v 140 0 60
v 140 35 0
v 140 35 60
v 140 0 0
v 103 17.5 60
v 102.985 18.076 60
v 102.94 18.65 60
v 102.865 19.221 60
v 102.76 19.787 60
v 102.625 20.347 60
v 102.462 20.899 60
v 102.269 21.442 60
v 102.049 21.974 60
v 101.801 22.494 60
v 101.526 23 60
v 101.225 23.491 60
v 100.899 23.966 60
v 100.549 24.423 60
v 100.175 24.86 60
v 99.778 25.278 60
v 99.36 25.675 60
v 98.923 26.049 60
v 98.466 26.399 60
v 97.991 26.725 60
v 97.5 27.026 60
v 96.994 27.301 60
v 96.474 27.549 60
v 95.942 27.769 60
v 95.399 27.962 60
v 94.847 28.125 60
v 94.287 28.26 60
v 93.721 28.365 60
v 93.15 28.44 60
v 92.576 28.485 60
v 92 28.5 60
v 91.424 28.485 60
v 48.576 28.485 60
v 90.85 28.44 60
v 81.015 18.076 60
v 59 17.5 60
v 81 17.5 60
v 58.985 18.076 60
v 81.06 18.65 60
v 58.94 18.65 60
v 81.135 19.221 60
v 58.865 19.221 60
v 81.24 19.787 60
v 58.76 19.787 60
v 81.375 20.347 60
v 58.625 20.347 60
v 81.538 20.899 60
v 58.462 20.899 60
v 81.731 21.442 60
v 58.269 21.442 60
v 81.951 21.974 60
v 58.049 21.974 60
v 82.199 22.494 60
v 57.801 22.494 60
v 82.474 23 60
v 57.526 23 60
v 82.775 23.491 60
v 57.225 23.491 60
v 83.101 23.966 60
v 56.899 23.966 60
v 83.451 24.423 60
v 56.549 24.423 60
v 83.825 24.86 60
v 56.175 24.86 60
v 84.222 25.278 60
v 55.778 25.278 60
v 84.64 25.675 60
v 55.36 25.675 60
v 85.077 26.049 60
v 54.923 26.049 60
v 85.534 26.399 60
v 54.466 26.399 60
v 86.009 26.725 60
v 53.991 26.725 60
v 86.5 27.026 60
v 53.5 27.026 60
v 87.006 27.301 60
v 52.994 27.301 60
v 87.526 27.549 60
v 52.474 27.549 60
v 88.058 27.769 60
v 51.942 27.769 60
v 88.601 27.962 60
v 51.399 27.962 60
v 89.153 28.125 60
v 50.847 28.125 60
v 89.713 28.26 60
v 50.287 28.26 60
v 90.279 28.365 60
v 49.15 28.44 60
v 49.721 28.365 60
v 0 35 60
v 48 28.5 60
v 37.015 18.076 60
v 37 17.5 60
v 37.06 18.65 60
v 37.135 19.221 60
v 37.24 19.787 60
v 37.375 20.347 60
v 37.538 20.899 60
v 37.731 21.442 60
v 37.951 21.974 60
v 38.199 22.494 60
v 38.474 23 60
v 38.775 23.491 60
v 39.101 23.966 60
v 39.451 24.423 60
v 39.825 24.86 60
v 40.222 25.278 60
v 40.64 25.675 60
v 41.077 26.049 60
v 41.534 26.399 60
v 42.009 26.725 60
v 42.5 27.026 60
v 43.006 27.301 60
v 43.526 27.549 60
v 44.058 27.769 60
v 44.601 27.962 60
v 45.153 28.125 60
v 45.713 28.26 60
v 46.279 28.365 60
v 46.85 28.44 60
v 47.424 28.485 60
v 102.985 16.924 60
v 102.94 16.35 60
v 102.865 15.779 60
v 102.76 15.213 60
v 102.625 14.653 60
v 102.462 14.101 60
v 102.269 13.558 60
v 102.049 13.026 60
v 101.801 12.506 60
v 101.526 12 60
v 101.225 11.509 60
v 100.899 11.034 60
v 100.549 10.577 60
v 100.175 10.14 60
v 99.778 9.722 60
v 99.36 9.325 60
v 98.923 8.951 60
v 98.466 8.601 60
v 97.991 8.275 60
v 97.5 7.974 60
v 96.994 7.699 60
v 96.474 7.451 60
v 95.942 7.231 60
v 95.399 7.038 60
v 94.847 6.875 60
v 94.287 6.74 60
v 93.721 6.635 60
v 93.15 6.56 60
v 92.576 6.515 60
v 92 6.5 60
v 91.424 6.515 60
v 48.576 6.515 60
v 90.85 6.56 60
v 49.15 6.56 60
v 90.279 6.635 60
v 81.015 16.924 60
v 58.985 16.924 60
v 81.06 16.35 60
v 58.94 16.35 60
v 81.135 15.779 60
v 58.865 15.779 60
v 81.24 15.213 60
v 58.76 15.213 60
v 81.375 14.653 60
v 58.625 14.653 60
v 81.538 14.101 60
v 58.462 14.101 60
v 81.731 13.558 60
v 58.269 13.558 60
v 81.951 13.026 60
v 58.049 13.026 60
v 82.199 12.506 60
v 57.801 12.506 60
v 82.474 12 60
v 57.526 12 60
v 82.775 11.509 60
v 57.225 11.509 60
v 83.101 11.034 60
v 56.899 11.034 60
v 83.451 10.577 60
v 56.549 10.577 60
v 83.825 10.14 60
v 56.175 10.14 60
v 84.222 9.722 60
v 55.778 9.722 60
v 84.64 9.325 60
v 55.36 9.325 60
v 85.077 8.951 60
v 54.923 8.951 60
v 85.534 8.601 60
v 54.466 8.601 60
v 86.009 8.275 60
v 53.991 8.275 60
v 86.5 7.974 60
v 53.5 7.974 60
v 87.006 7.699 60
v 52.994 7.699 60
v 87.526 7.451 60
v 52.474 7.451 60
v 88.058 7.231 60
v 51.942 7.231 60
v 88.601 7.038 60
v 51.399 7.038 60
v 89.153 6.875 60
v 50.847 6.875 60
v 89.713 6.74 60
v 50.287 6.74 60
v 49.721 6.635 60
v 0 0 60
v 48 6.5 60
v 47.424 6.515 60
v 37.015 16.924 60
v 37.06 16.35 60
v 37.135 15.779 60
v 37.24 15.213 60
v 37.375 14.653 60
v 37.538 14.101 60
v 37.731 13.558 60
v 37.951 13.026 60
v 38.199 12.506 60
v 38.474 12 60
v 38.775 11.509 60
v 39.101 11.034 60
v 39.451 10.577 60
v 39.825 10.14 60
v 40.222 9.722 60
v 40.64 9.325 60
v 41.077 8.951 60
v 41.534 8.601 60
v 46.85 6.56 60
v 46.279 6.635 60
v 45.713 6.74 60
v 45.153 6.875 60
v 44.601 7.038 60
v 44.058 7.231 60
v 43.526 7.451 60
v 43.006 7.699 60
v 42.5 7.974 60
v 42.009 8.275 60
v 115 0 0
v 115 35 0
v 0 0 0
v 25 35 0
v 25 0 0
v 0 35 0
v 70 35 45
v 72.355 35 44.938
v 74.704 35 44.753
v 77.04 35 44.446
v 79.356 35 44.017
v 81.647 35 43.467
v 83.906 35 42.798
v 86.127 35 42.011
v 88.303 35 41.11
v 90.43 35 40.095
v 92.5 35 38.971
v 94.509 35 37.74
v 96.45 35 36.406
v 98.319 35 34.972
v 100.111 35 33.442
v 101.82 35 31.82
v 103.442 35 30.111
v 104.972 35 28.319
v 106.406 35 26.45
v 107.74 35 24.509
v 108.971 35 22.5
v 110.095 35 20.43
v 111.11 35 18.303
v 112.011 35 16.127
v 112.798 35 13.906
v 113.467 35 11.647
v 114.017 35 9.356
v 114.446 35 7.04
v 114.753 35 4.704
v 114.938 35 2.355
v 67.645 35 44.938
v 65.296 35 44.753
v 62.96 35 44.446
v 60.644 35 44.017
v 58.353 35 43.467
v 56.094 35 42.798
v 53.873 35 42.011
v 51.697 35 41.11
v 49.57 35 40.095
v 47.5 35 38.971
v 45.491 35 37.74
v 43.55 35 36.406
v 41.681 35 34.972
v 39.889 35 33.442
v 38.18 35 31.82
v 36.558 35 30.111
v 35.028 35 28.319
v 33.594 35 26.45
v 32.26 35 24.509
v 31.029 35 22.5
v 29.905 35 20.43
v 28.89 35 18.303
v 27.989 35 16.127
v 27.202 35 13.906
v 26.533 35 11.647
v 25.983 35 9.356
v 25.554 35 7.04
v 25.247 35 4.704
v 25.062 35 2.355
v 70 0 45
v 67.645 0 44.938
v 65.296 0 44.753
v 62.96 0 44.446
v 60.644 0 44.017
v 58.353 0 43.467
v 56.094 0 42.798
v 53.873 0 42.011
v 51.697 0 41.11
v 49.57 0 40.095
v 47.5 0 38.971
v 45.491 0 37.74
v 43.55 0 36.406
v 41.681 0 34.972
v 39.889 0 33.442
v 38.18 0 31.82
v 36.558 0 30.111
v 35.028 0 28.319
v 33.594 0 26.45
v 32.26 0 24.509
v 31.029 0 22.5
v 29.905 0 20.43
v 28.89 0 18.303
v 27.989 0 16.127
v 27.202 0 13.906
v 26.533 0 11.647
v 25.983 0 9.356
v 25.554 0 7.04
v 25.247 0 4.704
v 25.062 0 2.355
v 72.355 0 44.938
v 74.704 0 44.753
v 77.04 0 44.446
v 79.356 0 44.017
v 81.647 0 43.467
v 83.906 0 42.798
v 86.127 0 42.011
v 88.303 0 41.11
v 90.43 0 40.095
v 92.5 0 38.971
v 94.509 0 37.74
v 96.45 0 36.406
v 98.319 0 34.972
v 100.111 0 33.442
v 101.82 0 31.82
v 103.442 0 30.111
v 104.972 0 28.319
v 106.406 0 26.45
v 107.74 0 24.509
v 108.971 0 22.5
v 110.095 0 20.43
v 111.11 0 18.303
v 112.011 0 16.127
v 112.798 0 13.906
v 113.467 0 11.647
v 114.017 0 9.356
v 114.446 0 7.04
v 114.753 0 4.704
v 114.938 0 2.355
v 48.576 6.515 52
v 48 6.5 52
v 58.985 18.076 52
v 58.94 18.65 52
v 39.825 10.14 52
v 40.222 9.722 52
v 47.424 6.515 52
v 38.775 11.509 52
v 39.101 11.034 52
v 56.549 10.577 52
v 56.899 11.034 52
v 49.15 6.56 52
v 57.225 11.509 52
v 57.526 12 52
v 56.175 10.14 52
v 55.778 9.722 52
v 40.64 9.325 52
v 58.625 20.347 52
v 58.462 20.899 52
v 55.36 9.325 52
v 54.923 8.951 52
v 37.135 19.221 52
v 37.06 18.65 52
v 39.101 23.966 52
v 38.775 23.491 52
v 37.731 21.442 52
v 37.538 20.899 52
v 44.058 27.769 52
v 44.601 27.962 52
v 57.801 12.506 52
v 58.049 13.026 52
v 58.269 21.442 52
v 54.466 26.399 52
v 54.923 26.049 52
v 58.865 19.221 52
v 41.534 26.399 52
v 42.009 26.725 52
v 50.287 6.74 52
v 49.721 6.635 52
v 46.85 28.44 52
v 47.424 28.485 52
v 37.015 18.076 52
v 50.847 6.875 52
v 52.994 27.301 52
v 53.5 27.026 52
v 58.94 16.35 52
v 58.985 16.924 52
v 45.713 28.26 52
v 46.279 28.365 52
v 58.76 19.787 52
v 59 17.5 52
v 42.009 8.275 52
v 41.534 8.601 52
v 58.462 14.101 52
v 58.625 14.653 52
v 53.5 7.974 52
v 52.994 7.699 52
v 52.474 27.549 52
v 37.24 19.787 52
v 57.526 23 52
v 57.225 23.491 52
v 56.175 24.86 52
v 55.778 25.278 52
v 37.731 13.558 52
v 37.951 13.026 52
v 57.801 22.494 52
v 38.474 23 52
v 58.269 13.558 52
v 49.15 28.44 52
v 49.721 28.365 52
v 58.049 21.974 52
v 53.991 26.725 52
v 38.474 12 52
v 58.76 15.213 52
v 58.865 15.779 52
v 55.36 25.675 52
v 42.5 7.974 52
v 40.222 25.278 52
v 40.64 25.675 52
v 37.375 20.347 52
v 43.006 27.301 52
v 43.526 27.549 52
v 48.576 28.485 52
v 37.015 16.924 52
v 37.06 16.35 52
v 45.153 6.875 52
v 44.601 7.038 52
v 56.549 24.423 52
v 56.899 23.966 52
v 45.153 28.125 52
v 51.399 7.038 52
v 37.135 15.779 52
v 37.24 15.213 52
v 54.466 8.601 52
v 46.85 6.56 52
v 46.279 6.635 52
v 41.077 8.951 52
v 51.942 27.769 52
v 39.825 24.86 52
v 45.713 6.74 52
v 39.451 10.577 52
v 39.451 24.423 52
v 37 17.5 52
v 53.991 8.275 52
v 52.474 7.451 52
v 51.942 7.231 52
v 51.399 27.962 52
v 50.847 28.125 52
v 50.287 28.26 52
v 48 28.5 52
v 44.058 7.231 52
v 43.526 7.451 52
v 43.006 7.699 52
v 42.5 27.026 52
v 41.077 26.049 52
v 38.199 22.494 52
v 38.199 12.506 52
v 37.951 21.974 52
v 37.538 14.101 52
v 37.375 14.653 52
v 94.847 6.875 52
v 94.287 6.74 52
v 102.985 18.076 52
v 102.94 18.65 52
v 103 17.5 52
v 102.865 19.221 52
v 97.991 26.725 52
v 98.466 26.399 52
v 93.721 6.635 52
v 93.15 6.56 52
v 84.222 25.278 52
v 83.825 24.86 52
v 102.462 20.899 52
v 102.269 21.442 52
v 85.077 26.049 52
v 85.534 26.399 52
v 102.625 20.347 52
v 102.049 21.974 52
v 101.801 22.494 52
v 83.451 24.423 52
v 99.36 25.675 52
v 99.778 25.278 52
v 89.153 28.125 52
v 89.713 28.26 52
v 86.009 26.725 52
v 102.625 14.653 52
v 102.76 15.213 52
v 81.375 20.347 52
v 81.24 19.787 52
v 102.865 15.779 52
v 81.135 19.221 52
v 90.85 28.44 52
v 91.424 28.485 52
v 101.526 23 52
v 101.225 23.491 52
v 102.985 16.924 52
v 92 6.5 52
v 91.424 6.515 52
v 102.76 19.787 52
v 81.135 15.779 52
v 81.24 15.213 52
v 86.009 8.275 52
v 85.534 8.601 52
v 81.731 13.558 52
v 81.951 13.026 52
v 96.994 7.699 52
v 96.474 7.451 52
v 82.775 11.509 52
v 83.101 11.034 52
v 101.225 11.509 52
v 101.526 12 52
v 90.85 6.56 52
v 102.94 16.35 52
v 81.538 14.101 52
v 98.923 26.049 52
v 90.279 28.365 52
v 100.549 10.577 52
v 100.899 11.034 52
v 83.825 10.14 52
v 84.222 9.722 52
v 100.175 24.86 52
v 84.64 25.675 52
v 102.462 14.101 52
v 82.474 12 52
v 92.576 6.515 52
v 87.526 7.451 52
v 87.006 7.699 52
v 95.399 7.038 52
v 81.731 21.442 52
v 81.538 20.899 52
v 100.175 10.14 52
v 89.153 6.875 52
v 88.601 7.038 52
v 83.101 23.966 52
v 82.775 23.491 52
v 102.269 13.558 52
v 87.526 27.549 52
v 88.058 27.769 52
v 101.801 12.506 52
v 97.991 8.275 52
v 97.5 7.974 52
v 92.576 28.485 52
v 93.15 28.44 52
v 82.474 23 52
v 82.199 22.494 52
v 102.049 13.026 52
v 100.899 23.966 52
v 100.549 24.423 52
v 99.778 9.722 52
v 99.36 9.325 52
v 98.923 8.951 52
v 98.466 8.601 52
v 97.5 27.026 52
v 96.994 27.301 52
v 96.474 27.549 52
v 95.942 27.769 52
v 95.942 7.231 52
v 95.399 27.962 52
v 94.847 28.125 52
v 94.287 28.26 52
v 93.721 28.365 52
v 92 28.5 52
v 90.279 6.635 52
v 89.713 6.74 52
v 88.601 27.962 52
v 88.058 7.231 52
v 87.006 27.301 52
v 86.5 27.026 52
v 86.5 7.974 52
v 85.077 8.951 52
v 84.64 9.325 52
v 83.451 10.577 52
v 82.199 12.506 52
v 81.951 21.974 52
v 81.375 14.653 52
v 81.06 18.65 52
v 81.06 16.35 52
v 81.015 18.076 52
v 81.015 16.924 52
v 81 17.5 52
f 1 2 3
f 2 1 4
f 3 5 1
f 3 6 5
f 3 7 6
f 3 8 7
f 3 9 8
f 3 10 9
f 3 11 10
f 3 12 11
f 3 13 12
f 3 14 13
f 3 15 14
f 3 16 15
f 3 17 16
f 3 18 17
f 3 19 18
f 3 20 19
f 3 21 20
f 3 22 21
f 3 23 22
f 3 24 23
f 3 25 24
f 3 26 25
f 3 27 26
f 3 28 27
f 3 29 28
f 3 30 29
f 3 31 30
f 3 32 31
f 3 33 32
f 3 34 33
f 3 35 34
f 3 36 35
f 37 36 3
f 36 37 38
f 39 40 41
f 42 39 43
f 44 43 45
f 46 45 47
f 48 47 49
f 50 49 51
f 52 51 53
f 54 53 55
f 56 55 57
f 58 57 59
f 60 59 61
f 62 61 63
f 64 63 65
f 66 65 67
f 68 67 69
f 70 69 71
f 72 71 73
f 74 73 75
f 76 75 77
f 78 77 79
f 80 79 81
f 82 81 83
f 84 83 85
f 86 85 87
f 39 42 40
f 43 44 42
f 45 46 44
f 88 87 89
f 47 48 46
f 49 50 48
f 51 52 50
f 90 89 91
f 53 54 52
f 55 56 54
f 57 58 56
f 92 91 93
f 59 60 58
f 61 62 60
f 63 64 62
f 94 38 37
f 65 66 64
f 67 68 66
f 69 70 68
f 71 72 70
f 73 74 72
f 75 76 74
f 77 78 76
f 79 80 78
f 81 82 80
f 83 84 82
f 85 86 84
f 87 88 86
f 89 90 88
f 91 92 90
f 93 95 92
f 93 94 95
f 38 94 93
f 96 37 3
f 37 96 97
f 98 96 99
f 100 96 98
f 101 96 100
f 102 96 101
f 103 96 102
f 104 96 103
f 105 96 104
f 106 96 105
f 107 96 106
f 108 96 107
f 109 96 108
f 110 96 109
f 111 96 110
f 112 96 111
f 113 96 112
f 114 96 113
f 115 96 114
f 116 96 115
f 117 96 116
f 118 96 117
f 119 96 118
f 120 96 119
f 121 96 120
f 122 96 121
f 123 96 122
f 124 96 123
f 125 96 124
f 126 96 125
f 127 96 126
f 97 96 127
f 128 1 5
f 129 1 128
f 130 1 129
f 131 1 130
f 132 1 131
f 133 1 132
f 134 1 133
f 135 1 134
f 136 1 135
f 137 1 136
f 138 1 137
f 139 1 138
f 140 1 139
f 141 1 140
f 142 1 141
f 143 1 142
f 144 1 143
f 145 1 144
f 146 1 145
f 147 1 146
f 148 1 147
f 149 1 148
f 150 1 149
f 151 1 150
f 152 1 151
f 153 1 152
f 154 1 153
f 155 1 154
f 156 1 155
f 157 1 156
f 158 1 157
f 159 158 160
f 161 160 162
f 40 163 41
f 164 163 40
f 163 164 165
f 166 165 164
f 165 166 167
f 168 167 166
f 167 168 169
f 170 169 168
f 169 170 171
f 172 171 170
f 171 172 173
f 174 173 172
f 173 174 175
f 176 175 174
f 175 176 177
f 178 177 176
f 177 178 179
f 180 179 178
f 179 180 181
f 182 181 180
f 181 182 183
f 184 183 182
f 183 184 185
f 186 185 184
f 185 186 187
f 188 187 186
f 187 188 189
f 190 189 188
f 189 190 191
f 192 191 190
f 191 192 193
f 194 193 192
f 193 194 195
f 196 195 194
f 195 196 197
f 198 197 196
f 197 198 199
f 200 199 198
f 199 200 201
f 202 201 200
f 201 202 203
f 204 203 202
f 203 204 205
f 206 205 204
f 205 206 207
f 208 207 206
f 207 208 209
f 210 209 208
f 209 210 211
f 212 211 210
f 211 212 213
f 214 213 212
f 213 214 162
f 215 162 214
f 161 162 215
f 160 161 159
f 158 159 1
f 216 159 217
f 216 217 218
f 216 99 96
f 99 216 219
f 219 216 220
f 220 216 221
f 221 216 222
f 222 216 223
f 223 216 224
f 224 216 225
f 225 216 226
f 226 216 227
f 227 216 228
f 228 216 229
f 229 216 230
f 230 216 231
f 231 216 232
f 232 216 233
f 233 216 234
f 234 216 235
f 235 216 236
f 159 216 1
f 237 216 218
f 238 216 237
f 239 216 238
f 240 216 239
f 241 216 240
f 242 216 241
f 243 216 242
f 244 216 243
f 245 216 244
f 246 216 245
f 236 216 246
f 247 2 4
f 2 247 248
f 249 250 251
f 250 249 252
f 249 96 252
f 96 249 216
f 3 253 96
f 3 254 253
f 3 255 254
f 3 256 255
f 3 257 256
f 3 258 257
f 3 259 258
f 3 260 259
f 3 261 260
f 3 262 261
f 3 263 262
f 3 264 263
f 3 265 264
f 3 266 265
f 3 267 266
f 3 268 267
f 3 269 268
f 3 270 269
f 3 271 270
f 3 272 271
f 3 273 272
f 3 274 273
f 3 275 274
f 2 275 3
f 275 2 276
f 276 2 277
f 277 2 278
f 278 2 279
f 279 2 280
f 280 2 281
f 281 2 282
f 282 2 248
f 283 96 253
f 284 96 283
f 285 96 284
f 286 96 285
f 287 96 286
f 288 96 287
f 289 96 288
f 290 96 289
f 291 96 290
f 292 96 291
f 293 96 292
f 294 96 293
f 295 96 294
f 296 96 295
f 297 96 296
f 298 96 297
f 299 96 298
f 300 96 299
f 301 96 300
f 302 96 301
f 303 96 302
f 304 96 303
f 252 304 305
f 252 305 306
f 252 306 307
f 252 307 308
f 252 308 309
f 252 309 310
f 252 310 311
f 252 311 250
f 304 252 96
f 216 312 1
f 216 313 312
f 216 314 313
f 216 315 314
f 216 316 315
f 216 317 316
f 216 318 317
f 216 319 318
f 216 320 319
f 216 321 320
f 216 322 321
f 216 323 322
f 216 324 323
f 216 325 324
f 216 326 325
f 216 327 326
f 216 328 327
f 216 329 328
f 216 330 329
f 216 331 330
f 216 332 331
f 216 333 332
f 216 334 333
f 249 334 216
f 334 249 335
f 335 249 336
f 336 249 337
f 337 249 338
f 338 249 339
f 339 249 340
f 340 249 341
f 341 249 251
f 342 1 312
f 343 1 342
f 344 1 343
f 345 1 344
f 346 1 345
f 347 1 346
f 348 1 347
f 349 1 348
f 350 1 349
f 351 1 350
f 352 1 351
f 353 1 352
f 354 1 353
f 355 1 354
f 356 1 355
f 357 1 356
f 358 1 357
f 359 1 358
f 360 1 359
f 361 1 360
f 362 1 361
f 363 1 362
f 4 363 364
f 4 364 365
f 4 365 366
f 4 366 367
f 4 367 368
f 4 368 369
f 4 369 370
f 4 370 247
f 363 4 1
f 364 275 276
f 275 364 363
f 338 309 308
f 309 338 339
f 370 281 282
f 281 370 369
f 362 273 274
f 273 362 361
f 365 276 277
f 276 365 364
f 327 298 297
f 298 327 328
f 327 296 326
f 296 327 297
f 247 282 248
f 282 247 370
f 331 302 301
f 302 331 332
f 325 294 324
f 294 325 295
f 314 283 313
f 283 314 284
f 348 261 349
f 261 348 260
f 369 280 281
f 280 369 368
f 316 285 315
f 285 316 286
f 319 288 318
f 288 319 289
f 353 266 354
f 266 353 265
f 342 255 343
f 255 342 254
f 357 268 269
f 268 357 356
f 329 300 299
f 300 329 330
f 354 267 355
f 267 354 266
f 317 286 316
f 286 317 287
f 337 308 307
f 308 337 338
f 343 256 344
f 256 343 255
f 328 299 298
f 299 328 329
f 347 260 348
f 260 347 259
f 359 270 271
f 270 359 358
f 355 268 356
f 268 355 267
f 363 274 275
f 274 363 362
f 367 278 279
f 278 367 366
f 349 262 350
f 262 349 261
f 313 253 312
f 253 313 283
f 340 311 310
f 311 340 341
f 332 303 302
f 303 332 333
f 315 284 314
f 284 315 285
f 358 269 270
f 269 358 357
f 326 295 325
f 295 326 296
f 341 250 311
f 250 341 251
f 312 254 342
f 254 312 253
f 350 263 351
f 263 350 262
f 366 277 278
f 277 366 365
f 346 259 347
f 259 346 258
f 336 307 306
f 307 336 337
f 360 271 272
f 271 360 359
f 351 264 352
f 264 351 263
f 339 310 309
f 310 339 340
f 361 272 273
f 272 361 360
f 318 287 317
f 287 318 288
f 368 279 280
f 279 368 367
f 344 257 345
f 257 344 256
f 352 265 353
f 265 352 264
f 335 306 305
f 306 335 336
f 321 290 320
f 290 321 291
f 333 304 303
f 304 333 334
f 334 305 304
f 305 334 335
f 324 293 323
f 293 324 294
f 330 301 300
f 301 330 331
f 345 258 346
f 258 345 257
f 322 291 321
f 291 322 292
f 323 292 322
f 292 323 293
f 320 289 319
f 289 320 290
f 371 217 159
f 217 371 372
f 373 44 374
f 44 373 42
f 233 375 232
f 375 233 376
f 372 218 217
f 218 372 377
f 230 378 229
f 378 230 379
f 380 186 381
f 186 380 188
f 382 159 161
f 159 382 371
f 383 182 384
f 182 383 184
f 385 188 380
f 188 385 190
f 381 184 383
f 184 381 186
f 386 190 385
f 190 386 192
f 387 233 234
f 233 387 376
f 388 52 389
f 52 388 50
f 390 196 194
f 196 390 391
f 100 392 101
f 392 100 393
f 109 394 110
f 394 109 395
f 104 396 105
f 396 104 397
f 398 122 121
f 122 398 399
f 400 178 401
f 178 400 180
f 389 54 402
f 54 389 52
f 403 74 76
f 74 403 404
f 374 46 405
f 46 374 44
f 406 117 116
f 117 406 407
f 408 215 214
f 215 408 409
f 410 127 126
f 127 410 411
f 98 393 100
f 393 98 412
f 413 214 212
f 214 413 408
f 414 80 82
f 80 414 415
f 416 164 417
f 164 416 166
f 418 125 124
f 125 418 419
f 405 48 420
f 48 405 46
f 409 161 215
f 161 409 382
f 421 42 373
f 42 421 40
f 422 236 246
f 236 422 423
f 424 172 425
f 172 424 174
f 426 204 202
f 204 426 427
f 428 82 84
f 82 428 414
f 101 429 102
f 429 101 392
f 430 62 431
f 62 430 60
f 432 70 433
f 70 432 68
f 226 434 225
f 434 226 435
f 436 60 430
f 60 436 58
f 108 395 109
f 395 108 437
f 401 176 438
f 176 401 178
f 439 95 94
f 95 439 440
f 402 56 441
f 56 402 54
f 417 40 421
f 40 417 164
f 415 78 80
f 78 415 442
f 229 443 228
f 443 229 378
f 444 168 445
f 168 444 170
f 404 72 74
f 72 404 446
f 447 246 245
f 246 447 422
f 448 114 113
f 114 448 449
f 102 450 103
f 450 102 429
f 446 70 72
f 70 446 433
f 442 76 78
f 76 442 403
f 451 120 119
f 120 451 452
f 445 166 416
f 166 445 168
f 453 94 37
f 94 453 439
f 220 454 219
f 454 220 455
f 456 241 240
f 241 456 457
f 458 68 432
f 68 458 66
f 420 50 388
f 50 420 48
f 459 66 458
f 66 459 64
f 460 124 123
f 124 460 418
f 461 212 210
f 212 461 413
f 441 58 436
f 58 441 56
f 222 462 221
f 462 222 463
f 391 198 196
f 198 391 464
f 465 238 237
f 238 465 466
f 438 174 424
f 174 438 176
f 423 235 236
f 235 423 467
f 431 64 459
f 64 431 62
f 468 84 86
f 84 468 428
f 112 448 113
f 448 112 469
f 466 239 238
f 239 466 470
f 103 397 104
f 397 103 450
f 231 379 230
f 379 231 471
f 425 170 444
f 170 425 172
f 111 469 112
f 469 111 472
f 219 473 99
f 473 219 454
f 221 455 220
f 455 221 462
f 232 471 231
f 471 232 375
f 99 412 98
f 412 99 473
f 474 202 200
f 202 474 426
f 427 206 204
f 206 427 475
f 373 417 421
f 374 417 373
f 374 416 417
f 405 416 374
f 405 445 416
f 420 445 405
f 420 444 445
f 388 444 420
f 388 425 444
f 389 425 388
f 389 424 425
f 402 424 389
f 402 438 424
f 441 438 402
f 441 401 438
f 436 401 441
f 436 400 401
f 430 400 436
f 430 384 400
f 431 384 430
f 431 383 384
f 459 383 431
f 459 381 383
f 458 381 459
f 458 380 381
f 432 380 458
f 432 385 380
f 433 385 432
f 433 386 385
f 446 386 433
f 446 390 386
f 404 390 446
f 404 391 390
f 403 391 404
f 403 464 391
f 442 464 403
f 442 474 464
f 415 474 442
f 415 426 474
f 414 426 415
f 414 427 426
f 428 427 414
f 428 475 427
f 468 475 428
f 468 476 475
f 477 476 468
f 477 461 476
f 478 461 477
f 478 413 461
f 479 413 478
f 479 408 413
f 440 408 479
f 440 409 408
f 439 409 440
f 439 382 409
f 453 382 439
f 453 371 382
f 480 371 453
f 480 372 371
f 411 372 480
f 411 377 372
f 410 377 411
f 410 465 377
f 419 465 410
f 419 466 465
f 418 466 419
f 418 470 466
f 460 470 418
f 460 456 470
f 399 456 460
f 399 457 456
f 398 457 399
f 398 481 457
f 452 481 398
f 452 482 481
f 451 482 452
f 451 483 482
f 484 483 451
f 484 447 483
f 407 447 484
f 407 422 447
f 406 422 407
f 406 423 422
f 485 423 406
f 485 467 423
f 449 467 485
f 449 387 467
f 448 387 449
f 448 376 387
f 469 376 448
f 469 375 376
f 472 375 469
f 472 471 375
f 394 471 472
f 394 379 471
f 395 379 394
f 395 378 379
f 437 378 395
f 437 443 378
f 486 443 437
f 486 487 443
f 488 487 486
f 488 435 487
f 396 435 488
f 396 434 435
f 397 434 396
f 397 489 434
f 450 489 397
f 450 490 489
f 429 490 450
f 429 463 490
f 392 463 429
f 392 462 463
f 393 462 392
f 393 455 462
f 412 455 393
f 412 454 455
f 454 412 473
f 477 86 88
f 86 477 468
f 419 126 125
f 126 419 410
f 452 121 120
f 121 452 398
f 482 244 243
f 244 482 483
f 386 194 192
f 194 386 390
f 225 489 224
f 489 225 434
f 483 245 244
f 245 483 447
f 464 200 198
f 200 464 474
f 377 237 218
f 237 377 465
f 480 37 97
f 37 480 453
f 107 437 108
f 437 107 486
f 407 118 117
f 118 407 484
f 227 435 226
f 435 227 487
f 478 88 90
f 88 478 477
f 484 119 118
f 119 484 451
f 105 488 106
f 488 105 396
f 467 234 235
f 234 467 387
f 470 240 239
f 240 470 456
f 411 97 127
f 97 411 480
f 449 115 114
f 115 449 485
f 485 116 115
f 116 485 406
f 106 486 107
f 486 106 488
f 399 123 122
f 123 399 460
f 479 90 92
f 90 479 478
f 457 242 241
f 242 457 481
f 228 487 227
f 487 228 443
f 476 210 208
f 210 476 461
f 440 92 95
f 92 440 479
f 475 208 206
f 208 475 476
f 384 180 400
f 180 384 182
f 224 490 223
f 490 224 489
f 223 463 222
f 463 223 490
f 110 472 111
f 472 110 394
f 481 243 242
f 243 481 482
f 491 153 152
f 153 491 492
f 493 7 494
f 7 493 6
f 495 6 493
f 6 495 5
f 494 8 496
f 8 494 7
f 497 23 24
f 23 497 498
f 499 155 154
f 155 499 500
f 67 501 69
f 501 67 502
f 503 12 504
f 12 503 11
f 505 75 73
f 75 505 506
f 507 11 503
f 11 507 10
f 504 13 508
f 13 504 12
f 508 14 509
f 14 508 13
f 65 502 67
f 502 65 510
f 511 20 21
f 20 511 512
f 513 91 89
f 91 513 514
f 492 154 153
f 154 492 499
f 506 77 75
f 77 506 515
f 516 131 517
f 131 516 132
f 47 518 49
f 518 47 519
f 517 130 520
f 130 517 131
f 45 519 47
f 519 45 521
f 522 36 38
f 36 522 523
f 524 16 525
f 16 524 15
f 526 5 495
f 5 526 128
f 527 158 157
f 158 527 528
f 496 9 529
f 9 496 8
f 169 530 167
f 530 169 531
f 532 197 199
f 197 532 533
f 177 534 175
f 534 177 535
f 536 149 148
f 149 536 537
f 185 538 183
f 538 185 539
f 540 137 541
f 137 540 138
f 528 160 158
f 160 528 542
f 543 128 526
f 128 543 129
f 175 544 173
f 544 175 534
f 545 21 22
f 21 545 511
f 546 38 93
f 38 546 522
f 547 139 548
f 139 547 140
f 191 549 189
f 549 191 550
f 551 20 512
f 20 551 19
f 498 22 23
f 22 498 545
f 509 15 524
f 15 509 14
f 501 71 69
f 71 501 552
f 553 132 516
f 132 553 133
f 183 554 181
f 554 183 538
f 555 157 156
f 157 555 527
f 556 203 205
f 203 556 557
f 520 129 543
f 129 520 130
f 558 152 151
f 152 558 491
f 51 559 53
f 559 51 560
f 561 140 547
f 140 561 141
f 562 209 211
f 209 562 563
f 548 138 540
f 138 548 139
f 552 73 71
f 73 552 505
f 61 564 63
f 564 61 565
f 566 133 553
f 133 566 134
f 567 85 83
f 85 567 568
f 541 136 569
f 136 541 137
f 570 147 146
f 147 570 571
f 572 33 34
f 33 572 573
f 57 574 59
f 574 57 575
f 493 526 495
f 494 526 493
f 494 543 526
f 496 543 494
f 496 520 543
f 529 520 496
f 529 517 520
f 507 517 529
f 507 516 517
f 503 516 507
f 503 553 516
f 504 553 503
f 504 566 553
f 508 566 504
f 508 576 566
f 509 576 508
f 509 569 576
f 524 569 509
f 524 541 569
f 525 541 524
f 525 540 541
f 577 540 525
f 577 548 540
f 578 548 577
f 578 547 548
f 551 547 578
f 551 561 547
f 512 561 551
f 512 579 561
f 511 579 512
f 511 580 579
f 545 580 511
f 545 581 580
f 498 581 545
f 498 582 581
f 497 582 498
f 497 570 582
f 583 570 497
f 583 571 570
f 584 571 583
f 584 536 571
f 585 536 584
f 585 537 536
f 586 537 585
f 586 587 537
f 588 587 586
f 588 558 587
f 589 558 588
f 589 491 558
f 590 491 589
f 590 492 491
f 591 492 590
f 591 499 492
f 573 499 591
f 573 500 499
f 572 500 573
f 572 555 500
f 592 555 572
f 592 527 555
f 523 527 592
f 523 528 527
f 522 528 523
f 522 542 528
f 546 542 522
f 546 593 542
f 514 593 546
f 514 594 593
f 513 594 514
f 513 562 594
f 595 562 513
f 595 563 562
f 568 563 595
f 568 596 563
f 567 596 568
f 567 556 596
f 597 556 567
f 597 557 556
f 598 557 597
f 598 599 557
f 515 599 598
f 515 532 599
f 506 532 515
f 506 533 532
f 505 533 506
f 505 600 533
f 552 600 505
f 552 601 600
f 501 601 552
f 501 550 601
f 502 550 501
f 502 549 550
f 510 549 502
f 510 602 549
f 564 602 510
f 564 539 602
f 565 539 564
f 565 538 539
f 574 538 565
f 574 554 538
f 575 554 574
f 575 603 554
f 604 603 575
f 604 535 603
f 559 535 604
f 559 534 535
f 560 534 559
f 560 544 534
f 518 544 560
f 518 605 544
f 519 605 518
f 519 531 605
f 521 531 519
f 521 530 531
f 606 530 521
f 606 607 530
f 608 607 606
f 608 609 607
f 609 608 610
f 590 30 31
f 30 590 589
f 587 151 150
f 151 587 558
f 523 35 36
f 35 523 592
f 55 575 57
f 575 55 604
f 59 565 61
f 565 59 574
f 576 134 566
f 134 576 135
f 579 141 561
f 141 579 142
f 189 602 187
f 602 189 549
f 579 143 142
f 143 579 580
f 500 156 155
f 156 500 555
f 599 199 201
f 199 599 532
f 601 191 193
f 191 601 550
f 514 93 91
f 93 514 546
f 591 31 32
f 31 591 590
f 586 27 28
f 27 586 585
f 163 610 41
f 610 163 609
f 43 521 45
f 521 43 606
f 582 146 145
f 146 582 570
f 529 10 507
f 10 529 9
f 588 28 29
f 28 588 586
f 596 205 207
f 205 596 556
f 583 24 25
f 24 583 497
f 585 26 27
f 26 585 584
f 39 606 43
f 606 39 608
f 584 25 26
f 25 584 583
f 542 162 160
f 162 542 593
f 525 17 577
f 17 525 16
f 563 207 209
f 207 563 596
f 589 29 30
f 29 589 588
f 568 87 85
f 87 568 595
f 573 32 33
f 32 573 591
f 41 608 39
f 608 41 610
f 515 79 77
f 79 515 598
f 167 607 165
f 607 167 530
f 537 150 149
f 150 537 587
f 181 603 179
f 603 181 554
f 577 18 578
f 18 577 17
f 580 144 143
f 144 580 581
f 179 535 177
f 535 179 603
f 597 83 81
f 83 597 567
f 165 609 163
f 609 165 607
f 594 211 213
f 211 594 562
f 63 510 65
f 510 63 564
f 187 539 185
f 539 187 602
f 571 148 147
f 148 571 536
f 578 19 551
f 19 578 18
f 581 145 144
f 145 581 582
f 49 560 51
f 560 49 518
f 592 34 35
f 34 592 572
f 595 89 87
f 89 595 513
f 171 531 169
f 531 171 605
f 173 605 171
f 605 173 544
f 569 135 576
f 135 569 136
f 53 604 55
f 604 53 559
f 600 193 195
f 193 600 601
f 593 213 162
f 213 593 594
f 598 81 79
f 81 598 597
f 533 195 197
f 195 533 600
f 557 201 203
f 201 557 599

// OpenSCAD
// === Parameters ===

// Main body dimensions
body_length = 140;        // Overall length (X)
body_depth  = 35;         // Thickness / extrusion depth (Y)
body_height = 60;         // Overall height (Z)

// Arch void parameters
arch_radius = 45;         // Radius of the curved underside void
                          // (must be < body_height to preserve top slab,
                          //  and < body_length/2 to leave solid end pillars)

// Paired circular recess parameters
recess_diameter = 22;     // Diameter of each circular cut
recess_depth    = 8;      // How deep each recess is cut from the top
recess_spacing  = 44;     // Center-to-center distance between the pair

// Resolution
$fn = 120;

// === Derived values ===
pillar_width = (body_length - 2 * arch_radius) / 2;   // solid width at each end
slab_thickness = body_height - arch_radius;            // flat slab above the arch apex

// === Modules ===

// Main arch body: rectangular block with a half-cylinder void underneath
module arch_body() {
    difference() {
        // Full solid rectangular block
        cube([body_length, body_depth, body_height]);

        // Semicircular arch void running through the depth (Y direction)
        // Centered along the length, sitting at the bottom plane (Z = 0)
        translate([body_length / 2, -1, 0])
            rotate([-90, 0, 0])
                cylinder(h = body_depth + 2, r = arch_radius);
    }
}

// Circular pocket cut — a single cylindrical recess from the top
module top_recess(x_pos, y_pos) {
    translate([x_pos, y_pos, body_height - recess_depth])
        cylinder(h = recess_depth + 0.1, d = recess_diameter);
}

// === Final Assembly ===

echo(str("Pillar width each side: ", pillar_width, " mm"));
echo(str("Top slab thickness: ", slab_thickness, " mm"));

difference() {
    // Step 1 — Arch-shaped main body
    arch_body();

    // Step 2 — Paired circular recesses on the top surface
    //          Symmetrically placed about the center of the body
    top_recess(body_length / 2 - recess_spacing / 2, body_depth / 2);
    top_recess(body_length / 2 + recess_spacing / 2, body_depth / 2);
}
